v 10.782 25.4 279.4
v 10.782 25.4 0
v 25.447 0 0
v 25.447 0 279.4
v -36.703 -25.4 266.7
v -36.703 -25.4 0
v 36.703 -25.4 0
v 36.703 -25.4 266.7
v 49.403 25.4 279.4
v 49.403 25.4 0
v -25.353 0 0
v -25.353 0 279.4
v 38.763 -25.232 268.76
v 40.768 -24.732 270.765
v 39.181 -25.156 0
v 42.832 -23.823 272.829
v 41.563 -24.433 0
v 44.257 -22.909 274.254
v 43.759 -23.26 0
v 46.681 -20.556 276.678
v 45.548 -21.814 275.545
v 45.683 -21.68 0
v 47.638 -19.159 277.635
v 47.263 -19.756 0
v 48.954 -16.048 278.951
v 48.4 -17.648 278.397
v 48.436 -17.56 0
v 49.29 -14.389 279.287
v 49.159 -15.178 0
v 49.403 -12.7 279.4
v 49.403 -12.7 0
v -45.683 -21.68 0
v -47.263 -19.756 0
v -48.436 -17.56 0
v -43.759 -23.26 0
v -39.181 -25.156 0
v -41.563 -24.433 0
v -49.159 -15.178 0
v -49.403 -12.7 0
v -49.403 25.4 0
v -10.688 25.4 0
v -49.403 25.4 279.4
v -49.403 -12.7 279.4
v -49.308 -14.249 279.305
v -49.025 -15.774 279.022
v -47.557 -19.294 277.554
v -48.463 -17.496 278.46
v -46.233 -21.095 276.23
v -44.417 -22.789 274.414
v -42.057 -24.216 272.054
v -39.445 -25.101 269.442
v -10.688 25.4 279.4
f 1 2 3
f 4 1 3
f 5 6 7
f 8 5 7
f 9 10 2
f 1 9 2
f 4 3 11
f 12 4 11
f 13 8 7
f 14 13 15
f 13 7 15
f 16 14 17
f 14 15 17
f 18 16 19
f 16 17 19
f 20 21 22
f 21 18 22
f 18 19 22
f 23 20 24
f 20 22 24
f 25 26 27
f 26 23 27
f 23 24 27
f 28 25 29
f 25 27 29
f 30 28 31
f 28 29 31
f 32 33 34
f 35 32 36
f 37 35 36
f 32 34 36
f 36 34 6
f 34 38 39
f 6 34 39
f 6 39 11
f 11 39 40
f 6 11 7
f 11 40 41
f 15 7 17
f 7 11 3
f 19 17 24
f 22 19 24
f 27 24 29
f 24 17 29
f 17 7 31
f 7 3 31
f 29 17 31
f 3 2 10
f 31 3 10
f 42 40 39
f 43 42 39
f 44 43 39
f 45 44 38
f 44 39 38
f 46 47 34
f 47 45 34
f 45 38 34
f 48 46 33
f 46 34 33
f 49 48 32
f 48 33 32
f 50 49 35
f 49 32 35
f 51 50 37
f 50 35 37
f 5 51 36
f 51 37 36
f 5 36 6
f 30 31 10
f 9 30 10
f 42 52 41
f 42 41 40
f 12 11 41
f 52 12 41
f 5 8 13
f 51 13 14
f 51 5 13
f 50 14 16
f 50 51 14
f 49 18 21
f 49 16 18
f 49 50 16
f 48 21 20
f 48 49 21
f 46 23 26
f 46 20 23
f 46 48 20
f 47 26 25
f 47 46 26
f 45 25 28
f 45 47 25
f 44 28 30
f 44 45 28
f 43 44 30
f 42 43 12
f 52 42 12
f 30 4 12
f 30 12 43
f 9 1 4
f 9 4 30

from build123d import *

# Parameters (mm, degrees)
F1_DEPTH    = 279.4
F2_T1_DEPTH = 136.906


# Not quite as in the source:
# - a fillet or chamfer that OpenCascade refuses, or shapes differently, is made with other operations: its cross-section is extruded or revolved along the edge and cut away or added


with BuildPart() as f1:
    # F0 (on Top) → F1 (new body)
    with BuildSketch(Plane.XY):
        with BuildLine():
            Line((49.403, -12.7), (49.403, 25.4))
            Line((49.403, 25.4), (10.7822931626, 25.4))
            Line((10.7822931626, 25.4), (25.44699, 0))
            Line((25.44699, 0), (-25.35301, 0))
            Line((-25.35301, 0), (-10.6883131626, 25.4))
            Line((-10.6883131626, 25.4), (-49.403, 25.4))
            Line((-49.403, 25.4), (-49.403, -12.7))
            ThreePointArc((-49.403, -12.7), (-45.6832561211, -21.6802561211), (-36.703, -25.4))
            Line((-36.703, -25.4), (36.703, -25.4))
            ThreePointArc((36.703, -25.4), (45.6832561211, -21.6802561211), (49.403, -12.7))
        make_face()
    extrude(amount=F1_DEPTH)

    # F2: fillet of radius 12.7 on 1 edges, made by hand

    # F2_s2 → F2_t1 (cut)
    with BuildSketch(Plane.YZ.offset(-68.453)):
        with BuildLine():
            ThreePointArc((-25.4, 266.7), (-21.6802561211, 275.6802561211), (-12.7, 279.4))
            Line((-12.7, 279.4), (-25.4, 279.4))
            Line((-25.4, 279.4), (-25.4, 266.7))
        make_face()
    extrude(amount=F2_T1_DEPTH, mode=Mode.SUBTRACT)


solid = f1.part
